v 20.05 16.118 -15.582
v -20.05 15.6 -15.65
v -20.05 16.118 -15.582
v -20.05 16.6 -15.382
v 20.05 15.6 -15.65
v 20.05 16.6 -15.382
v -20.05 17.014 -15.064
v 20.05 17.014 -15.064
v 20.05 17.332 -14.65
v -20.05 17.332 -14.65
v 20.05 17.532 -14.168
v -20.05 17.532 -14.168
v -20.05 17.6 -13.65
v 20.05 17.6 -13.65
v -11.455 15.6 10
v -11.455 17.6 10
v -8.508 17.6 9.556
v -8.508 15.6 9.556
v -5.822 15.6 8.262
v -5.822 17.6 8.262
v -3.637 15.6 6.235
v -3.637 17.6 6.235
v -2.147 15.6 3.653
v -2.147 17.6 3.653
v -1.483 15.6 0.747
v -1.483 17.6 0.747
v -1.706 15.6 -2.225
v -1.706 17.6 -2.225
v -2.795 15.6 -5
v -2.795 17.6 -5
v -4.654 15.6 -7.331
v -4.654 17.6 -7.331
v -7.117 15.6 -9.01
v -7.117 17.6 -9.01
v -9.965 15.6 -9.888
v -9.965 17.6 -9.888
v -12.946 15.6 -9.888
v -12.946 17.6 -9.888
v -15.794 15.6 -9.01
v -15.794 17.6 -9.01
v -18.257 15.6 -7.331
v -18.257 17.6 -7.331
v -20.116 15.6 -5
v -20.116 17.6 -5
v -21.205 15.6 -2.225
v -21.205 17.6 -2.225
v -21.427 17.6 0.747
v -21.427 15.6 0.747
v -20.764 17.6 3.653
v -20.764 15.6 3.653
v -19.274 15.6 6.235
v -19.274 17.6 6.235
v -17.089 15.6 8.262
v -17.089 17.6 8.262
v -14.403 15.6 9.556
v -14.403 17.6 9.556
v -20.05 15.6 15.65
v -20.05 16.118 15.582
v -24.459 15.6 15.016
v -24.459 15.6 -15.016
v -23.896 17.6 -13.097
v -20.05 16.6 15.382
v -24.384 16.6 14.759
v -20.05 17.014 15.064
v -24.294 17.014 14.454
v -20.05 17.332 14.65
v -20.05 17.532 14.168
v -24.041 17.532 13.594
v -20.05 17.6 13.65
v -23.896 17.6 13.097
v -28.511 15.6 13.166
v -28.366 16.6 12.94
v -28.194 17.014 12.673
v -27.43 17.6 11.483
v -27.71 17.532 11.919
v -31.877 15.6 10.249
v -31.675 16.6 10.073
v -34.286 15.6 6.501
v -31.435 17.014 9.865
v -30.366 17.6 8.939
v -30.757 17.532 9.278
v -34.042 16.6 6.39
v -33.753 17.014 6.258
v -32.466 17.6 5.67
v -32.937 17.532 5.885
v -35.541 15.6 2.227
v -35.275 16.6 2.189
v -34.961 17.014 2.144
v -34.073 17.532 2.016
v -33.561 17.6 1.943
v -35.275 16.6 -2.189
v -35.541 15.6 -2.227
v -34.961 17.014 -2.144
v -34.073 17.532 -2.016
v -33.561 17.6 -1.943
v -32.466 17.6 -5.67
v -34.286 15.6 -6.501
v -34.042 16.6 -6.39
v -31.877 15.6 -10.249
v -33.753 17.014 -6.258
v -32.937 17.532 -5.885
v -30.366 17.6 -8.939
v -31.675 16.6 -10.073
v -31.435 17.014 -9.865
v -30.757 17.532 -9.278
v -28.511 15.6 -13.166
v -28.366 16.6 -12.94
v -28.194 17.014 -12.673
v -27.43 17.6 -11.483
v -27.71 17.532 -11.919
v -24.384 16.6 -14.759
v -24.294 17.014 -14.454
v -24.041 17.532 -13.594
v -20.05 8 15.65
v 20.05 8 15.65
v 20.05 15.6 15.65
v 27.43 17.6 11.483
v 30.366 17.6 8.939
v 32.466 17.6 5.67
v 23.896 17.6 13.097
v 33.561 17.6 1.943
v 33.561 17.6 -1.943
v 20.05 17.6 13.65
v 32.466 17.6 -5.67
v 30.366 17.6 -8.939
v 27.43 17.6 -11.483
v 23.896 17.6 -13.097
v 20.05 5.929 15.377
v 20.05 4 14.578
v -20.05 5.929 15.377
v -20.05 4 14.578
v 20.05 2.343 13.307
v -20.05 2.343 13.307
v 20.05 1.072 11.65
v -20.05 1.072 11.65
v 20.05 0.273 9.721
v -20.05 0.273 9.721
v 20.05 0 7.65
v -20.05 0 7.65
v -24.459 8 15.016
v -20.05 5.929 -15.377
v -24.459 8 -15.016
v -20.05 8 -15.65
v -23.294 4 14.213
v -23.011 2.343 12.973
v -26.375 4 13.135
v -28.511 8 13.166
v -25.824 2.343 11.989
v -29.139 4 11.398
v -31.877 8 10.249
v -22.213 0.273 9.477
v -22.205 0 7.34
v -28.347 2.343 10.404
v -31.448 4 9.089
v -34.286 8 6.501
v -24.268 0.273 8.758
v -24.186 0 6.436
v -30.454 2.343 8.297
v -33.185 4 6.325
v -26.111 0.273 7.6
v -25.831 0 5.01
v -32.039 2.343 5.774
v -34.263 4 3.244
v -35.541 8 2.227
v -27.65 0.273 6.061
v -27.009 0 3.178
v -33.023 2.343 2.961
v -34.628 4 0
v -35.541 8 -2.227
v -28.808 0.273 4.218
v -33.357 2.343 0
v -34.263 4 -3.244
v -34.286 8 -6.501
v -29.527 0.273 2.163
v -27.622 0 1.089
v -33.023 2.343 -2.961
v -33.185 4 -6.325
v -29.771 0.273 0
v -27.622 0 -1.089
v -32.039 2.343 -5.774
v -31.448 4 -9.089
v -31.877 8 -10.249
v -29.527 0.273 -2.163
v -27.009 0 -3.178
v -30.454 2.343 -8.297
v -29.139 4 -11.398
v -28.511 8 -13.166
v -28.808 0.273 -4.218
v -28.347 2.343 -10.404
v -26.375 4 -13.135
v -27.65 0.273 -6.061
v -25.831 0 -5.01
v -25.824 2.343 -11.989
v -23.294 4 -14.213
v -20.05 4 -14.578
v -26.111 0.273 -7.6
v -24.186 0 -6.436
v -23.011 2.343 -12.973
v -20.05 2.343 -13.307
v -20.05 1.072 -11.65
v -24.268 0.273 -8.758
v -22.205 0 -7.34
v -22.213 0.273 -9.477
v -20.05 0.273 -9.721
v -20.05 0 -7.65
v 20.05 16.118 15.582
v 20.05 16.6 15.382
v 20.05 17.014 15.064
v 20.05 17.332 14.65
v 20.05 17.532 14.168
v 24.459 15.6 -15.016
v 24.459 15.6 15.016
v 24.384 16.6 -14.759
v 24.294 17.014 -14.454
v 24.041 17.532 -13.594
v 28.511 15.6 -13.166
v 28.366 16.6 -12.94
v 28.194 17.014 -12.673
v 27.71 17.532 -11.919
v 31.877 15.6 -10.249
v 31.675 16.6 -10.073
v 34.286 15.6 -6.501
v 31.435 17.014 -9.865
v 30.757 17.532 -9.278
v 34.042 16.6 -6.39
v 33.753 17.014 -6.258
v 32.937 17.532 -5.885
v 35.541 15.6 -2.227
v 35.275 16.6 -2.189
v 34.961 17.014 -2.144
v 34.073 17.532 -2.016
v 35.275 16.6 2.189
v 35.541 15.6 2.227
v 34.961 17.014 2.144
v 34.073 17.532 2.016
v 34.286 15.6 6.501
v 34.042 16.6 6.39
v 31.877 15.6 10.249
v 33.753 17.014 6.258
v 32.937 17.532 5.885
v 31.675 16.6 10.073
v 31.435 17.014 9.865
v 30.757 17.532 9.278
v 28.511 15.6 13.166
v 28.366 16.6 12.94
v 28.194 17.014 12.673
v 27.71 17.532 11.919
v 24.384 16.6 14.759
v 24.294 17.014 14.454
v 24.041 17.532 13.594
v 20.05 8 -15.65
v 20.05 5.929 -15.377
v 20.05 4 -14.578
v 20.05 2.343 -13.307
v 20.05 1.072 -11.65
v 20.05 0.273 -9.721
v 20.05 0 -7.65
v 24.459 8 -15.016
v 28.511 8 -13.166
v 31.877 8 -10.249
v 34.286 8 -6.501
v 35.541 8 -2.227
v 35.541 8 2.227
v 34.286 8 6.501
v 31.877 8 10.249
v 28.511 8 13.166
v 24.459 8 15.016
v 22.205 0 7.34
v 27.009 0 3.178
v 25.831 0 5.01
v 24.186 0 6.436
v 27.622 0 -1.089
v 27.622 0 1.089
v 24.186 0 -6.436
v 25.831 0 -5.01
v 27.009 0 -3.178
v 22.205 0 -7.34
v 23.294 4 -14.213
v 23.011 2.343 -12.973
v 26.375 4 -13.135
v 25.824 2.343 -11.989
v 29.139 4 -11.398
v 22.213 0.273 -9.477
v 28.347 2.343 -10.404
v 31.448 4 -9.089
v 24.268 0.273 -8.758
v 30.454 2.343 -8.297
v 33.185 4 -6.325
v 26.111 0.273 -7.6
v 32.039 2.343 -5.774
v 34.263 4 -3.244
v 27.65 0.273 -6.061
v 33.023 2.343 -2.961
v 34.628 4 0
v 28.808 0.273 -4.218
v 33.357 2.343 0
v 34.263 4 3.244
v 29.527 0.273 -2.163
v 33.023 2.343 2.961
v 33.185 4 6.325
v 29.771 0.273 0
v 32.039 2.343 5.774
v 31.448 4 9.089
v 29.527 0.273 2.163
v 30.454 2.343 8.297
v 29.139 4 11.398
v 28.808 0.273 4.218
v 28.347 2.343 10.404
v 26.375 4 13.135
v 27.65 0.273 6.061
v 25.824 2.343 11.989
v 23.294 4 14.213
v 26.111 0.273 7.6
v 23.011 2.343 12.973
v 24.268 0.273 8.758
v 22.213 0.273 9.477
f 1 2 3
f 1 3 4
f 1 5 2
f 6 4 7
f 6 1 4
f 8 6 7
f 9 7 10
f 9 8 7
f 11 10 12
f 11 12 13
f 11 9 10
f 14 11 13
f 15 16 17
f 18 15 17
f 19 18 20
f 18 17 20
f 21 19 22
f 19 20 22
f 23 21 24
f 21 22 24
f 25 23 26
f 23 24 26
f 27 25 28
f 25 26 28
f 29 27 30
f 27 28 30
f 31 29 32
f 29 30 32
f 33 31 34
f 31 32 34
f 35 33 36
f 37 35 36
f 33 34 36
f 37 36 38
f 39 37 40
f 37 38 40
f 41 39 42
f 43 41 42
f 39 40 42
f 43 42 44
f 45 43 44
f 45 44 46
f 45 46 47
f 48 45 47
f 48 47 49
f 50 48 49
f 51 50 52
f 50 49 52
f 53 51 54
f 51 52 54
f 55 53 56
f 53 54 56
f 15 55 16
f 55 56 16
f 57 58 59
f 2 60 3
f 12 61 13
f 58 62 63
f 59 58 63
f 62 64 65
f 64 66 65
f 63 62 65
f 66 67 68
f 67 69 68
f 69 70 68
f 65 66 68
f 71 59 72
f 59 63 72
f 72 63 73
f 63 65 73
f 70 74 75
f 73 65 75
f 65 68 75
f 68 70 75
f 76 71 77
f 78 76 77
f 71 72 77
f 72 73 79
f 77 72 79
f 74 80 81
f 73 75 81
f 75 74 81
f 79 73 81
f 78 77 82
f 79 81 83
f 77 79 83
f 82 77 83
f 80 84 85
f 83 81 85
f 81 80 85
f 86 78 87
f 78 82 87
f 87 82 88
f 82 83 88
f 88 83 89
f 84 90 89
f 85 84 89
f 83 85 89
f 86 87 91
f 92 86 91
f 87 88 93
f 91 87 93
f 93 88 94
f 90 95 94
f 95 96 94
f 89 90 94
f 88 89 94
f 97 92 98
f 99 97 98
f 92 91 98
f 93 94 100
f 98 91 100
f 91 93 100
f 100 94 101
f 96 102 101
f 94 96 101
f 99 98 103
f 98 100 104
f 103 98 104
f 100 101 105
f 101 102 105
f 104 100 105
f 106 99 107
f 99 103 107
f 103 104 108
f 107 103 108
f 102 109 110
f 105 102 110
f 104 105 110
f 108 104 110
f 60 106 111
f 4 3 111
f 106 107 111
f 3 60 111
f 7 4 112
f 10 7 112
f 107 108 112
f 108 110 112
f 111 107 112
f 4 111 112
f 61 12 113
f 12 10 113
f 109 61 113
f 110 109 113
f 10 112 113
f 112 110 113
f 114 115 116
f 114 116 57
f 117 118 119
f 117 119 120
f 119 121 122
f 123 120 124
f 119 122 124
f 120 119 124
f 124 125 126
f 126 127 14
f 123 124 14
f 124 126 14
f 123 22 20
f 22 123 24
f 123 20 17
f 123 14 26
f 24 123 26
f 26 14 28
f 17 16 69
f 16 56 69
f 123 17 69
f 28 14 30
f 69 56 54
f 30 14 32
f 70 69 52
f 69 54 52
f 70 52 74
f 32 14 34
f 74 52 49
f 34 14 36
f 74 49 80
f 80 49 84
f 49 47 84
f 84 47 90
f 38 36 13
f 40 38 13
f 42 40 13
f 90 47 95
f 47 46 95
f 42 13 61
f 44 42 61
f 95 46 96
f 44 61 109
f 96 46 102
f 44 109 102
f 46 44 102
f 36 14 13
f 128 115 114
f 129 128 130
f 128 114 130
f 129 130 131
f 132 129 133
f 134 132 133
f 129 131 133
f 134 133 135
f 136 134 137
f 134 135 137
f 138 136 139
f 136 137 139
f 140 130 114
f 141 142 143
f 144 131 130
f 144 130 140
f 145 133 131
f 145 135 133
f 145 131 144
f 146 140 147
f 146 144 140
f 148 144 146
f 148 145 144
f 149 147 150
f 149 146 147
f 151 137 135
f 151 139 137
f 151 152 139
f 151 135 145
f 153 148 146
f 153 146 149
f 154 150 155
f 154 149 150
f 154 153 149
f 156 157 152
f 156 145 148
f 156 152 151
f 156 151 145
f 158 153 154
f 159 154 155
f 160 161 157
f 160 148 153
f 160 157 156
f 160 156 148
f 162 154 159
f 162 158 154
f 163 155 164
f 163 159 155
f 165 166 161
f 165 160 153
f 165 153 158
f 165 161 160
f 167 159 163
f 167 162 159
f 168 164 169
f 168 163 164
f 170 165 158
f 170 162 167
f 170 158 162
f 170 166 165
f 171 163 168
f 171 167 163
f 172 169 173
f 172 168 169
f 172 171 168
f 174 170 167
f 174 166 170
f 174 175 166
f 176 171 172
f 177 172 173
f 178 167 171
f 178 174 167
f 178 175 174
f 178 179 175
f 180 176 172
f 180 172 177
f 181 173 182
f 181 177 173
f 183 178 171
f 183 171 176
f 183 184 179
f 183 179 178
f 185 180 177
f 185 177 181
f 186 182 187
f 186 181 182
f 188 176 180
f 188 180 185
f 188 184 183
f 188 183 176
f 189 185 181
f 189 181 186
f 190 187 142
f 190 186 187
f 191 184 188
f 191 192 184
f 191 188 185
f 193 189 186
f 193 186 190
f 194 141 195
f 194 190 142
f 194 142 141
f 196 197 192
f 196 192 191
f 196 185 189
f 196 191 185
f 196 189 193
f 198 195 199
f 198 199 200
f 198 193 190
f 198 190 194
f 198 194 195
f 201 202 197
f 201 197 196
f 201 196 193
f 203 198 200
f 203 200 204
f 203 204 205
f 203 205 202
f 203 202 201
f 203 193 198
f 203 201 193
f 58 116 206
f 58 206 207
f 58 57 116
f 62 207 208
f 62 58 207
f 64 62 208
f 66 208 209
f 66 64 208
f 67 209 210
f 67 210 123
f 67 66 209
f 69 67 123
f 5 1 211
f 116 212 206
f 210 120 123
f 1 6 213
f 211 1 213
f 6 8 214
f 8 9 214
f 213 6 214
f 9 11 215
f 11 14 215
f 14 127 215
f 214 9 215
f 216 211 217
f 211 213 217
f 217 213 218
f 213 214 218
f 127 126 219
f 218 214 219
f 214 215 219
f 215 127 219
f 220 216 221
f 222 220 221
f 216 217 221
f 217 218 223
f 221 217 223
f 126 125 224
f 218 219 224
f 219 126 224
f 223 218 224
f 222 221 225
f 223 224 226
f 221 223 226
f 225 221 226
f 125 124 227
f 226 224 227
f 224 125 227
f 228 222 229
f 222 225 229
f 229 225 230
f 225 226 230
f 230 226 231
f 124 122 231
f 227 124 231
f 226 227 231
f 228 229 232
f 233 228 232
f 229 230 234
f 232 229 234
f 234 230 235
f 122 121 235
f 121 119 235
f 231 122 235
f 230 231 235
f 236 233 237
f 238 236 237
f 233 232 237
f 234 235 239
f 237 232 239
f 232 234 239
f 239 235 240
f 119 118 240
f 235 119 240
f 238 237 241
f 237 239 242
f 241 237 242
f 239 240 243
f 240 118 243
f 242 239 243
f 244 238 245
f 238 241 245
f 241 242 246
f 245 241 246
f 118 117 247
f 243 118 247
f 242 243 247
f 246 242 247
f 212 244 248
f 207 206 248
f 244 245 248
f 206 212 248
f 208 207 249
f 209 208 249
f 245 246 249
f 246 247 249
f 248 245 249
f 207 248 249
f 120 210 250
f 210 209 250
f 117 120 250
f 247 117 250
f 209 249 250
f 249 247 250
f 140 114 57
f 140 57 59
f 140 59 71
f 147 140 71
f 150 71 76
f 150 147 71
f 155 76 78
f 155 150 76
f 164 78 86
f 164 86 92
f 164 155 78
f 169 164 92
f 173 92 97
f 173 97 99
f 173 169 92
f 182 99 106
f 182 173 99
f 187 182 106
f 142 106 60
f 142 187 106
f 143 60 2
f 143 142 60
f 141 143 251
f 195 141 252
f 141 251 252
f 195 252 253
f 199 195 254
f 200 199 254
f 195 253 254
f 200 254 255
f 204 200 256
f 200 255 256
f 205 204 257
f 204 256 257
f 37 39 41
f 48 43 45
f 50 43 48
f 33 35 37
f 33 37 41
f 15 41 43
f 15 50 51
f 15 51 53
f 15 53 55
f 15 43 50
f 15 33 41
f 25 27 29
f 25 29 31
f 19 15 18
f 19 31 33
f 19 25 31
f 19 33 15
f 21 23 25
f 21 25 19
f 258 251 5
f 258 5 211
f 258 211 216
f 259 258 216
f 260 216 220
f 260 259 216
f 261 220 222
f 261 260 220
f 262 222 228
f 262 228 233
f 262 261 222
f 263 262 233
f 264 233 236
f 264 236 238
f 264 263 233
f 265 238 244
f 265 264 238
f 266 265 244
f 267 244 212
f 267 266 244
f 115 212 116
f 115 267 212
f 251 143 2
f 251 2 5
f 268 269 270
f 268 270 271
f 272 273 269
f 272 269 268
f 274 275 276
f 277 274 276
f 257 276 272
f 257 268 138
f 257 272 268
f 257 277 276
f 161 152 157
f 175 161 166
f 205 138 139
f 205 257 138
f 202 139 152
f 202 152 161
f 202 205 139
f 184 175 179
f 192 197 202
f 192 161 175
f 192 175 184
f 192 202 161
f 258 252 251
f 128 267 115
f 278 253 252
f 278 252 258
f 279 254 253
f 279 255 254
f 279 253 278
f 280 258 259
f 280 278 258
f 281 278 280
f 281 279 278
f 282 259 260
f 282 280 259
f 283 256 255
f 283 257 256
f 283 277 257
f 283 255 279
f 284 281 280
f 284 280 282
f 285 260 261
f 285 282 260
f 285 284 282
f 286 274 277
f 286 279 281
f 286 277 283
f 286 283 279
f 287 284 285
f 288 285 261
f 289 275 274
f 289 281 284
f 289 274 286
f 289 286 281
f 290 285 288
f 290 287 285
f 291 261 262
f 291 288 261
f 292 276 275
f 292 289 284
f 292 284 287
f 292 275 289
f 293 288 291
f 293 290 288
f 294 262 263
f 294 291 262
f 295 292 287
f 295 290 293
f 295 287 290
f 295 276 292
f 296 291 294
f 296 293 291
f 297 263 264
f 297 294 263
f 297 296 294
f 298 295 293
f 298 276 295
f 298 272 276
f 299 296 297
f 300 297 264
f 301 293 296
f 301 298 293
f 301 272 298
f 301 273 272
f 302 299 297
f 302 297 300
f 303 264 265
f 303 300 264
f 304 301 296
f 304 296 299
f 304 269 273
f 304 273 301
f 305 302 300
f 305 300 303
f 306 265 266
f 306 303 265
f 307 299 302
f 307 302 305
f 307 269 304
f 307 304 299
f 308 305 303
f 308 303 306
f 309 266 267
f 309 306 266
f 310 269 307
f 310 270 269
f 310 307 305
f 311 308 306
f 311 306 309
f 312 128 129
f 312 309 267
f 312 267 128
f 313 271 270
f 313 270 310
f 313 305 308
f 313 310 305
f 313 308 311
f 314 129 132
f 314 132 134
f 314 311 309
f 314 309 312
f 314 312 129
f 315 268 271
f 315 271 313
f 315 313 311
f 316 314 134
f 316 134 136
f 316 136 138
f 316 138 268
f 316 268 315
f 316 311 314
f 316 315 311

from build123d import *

# Parameters (mm, degrees)
EXTRUDE_1_DEPTH     = 17.6
FILLET_2_R          = 2
FILLET_3_R          = 8
SKETCH_2_R          = 10
CUT_EXTRUDE_1_DEPTH = 2


with BuildPart() as part:
    # 草圖1 → 填料-伸長1 (new body)
    with BuildSketch(Plane(origin=(0, 0, 0), x_dir=(1, 0, 0), z_dir=(0, 1, 0))):
        with BuildLine():
            Line((-20.05, 15.65), (20.05, 15.65))
            ThreePointArc((20.05, 15.65), (35.7, 0), (20.05, -15.65))
            Line((20.05, -15.65), (-20.05, -15.65))
            ThreePointArc((-20.05, -15.65), (-35.7, 0), (-20.05, 15.65))
        make_face()
    extrude(amount=EXTRUDE_1_DEPTH)

    # 圓角2
    fillet_2_edges = [part.edges().sort_by_distance(p)[0] for p in [
        (35.7, 17.6, 0),
        (0, 17.6, -15.65),
        (-35.7, 17.6, 0),
        (0, 17.6, 15.65),
    ]]
    fillet(fillet_2_edges, radius=FILLET_2_R)

    # 圓角3
    fillet_3_edges = [part.edges().sort_by_distance(p)[0] for p in [
        (0, 0, -15.65),
        (35.7, 0, 0),
        (0, 0, 15.65),
        (-35.7, 0, 0),
    ]]
    fillet(fillet_3_edges, radius=FILLET_3_R)

    # 草圖2 → 除料-伸長1 (cut)
    with BuildSketch(Plane(origin=(0, 17.6, 0), x_dir=(1, 0, 0), z_dir=(0, 1, 0))):
        with Locations(Location((-11.455400627, 0, 0), (0, 0, 270))):
            Circle(SKETCH_2_R)
    extrude(amount=-CUT_EXTRUDE_1_DEPTH, mode=Mode.SUBTRACT)


solid = part.part
